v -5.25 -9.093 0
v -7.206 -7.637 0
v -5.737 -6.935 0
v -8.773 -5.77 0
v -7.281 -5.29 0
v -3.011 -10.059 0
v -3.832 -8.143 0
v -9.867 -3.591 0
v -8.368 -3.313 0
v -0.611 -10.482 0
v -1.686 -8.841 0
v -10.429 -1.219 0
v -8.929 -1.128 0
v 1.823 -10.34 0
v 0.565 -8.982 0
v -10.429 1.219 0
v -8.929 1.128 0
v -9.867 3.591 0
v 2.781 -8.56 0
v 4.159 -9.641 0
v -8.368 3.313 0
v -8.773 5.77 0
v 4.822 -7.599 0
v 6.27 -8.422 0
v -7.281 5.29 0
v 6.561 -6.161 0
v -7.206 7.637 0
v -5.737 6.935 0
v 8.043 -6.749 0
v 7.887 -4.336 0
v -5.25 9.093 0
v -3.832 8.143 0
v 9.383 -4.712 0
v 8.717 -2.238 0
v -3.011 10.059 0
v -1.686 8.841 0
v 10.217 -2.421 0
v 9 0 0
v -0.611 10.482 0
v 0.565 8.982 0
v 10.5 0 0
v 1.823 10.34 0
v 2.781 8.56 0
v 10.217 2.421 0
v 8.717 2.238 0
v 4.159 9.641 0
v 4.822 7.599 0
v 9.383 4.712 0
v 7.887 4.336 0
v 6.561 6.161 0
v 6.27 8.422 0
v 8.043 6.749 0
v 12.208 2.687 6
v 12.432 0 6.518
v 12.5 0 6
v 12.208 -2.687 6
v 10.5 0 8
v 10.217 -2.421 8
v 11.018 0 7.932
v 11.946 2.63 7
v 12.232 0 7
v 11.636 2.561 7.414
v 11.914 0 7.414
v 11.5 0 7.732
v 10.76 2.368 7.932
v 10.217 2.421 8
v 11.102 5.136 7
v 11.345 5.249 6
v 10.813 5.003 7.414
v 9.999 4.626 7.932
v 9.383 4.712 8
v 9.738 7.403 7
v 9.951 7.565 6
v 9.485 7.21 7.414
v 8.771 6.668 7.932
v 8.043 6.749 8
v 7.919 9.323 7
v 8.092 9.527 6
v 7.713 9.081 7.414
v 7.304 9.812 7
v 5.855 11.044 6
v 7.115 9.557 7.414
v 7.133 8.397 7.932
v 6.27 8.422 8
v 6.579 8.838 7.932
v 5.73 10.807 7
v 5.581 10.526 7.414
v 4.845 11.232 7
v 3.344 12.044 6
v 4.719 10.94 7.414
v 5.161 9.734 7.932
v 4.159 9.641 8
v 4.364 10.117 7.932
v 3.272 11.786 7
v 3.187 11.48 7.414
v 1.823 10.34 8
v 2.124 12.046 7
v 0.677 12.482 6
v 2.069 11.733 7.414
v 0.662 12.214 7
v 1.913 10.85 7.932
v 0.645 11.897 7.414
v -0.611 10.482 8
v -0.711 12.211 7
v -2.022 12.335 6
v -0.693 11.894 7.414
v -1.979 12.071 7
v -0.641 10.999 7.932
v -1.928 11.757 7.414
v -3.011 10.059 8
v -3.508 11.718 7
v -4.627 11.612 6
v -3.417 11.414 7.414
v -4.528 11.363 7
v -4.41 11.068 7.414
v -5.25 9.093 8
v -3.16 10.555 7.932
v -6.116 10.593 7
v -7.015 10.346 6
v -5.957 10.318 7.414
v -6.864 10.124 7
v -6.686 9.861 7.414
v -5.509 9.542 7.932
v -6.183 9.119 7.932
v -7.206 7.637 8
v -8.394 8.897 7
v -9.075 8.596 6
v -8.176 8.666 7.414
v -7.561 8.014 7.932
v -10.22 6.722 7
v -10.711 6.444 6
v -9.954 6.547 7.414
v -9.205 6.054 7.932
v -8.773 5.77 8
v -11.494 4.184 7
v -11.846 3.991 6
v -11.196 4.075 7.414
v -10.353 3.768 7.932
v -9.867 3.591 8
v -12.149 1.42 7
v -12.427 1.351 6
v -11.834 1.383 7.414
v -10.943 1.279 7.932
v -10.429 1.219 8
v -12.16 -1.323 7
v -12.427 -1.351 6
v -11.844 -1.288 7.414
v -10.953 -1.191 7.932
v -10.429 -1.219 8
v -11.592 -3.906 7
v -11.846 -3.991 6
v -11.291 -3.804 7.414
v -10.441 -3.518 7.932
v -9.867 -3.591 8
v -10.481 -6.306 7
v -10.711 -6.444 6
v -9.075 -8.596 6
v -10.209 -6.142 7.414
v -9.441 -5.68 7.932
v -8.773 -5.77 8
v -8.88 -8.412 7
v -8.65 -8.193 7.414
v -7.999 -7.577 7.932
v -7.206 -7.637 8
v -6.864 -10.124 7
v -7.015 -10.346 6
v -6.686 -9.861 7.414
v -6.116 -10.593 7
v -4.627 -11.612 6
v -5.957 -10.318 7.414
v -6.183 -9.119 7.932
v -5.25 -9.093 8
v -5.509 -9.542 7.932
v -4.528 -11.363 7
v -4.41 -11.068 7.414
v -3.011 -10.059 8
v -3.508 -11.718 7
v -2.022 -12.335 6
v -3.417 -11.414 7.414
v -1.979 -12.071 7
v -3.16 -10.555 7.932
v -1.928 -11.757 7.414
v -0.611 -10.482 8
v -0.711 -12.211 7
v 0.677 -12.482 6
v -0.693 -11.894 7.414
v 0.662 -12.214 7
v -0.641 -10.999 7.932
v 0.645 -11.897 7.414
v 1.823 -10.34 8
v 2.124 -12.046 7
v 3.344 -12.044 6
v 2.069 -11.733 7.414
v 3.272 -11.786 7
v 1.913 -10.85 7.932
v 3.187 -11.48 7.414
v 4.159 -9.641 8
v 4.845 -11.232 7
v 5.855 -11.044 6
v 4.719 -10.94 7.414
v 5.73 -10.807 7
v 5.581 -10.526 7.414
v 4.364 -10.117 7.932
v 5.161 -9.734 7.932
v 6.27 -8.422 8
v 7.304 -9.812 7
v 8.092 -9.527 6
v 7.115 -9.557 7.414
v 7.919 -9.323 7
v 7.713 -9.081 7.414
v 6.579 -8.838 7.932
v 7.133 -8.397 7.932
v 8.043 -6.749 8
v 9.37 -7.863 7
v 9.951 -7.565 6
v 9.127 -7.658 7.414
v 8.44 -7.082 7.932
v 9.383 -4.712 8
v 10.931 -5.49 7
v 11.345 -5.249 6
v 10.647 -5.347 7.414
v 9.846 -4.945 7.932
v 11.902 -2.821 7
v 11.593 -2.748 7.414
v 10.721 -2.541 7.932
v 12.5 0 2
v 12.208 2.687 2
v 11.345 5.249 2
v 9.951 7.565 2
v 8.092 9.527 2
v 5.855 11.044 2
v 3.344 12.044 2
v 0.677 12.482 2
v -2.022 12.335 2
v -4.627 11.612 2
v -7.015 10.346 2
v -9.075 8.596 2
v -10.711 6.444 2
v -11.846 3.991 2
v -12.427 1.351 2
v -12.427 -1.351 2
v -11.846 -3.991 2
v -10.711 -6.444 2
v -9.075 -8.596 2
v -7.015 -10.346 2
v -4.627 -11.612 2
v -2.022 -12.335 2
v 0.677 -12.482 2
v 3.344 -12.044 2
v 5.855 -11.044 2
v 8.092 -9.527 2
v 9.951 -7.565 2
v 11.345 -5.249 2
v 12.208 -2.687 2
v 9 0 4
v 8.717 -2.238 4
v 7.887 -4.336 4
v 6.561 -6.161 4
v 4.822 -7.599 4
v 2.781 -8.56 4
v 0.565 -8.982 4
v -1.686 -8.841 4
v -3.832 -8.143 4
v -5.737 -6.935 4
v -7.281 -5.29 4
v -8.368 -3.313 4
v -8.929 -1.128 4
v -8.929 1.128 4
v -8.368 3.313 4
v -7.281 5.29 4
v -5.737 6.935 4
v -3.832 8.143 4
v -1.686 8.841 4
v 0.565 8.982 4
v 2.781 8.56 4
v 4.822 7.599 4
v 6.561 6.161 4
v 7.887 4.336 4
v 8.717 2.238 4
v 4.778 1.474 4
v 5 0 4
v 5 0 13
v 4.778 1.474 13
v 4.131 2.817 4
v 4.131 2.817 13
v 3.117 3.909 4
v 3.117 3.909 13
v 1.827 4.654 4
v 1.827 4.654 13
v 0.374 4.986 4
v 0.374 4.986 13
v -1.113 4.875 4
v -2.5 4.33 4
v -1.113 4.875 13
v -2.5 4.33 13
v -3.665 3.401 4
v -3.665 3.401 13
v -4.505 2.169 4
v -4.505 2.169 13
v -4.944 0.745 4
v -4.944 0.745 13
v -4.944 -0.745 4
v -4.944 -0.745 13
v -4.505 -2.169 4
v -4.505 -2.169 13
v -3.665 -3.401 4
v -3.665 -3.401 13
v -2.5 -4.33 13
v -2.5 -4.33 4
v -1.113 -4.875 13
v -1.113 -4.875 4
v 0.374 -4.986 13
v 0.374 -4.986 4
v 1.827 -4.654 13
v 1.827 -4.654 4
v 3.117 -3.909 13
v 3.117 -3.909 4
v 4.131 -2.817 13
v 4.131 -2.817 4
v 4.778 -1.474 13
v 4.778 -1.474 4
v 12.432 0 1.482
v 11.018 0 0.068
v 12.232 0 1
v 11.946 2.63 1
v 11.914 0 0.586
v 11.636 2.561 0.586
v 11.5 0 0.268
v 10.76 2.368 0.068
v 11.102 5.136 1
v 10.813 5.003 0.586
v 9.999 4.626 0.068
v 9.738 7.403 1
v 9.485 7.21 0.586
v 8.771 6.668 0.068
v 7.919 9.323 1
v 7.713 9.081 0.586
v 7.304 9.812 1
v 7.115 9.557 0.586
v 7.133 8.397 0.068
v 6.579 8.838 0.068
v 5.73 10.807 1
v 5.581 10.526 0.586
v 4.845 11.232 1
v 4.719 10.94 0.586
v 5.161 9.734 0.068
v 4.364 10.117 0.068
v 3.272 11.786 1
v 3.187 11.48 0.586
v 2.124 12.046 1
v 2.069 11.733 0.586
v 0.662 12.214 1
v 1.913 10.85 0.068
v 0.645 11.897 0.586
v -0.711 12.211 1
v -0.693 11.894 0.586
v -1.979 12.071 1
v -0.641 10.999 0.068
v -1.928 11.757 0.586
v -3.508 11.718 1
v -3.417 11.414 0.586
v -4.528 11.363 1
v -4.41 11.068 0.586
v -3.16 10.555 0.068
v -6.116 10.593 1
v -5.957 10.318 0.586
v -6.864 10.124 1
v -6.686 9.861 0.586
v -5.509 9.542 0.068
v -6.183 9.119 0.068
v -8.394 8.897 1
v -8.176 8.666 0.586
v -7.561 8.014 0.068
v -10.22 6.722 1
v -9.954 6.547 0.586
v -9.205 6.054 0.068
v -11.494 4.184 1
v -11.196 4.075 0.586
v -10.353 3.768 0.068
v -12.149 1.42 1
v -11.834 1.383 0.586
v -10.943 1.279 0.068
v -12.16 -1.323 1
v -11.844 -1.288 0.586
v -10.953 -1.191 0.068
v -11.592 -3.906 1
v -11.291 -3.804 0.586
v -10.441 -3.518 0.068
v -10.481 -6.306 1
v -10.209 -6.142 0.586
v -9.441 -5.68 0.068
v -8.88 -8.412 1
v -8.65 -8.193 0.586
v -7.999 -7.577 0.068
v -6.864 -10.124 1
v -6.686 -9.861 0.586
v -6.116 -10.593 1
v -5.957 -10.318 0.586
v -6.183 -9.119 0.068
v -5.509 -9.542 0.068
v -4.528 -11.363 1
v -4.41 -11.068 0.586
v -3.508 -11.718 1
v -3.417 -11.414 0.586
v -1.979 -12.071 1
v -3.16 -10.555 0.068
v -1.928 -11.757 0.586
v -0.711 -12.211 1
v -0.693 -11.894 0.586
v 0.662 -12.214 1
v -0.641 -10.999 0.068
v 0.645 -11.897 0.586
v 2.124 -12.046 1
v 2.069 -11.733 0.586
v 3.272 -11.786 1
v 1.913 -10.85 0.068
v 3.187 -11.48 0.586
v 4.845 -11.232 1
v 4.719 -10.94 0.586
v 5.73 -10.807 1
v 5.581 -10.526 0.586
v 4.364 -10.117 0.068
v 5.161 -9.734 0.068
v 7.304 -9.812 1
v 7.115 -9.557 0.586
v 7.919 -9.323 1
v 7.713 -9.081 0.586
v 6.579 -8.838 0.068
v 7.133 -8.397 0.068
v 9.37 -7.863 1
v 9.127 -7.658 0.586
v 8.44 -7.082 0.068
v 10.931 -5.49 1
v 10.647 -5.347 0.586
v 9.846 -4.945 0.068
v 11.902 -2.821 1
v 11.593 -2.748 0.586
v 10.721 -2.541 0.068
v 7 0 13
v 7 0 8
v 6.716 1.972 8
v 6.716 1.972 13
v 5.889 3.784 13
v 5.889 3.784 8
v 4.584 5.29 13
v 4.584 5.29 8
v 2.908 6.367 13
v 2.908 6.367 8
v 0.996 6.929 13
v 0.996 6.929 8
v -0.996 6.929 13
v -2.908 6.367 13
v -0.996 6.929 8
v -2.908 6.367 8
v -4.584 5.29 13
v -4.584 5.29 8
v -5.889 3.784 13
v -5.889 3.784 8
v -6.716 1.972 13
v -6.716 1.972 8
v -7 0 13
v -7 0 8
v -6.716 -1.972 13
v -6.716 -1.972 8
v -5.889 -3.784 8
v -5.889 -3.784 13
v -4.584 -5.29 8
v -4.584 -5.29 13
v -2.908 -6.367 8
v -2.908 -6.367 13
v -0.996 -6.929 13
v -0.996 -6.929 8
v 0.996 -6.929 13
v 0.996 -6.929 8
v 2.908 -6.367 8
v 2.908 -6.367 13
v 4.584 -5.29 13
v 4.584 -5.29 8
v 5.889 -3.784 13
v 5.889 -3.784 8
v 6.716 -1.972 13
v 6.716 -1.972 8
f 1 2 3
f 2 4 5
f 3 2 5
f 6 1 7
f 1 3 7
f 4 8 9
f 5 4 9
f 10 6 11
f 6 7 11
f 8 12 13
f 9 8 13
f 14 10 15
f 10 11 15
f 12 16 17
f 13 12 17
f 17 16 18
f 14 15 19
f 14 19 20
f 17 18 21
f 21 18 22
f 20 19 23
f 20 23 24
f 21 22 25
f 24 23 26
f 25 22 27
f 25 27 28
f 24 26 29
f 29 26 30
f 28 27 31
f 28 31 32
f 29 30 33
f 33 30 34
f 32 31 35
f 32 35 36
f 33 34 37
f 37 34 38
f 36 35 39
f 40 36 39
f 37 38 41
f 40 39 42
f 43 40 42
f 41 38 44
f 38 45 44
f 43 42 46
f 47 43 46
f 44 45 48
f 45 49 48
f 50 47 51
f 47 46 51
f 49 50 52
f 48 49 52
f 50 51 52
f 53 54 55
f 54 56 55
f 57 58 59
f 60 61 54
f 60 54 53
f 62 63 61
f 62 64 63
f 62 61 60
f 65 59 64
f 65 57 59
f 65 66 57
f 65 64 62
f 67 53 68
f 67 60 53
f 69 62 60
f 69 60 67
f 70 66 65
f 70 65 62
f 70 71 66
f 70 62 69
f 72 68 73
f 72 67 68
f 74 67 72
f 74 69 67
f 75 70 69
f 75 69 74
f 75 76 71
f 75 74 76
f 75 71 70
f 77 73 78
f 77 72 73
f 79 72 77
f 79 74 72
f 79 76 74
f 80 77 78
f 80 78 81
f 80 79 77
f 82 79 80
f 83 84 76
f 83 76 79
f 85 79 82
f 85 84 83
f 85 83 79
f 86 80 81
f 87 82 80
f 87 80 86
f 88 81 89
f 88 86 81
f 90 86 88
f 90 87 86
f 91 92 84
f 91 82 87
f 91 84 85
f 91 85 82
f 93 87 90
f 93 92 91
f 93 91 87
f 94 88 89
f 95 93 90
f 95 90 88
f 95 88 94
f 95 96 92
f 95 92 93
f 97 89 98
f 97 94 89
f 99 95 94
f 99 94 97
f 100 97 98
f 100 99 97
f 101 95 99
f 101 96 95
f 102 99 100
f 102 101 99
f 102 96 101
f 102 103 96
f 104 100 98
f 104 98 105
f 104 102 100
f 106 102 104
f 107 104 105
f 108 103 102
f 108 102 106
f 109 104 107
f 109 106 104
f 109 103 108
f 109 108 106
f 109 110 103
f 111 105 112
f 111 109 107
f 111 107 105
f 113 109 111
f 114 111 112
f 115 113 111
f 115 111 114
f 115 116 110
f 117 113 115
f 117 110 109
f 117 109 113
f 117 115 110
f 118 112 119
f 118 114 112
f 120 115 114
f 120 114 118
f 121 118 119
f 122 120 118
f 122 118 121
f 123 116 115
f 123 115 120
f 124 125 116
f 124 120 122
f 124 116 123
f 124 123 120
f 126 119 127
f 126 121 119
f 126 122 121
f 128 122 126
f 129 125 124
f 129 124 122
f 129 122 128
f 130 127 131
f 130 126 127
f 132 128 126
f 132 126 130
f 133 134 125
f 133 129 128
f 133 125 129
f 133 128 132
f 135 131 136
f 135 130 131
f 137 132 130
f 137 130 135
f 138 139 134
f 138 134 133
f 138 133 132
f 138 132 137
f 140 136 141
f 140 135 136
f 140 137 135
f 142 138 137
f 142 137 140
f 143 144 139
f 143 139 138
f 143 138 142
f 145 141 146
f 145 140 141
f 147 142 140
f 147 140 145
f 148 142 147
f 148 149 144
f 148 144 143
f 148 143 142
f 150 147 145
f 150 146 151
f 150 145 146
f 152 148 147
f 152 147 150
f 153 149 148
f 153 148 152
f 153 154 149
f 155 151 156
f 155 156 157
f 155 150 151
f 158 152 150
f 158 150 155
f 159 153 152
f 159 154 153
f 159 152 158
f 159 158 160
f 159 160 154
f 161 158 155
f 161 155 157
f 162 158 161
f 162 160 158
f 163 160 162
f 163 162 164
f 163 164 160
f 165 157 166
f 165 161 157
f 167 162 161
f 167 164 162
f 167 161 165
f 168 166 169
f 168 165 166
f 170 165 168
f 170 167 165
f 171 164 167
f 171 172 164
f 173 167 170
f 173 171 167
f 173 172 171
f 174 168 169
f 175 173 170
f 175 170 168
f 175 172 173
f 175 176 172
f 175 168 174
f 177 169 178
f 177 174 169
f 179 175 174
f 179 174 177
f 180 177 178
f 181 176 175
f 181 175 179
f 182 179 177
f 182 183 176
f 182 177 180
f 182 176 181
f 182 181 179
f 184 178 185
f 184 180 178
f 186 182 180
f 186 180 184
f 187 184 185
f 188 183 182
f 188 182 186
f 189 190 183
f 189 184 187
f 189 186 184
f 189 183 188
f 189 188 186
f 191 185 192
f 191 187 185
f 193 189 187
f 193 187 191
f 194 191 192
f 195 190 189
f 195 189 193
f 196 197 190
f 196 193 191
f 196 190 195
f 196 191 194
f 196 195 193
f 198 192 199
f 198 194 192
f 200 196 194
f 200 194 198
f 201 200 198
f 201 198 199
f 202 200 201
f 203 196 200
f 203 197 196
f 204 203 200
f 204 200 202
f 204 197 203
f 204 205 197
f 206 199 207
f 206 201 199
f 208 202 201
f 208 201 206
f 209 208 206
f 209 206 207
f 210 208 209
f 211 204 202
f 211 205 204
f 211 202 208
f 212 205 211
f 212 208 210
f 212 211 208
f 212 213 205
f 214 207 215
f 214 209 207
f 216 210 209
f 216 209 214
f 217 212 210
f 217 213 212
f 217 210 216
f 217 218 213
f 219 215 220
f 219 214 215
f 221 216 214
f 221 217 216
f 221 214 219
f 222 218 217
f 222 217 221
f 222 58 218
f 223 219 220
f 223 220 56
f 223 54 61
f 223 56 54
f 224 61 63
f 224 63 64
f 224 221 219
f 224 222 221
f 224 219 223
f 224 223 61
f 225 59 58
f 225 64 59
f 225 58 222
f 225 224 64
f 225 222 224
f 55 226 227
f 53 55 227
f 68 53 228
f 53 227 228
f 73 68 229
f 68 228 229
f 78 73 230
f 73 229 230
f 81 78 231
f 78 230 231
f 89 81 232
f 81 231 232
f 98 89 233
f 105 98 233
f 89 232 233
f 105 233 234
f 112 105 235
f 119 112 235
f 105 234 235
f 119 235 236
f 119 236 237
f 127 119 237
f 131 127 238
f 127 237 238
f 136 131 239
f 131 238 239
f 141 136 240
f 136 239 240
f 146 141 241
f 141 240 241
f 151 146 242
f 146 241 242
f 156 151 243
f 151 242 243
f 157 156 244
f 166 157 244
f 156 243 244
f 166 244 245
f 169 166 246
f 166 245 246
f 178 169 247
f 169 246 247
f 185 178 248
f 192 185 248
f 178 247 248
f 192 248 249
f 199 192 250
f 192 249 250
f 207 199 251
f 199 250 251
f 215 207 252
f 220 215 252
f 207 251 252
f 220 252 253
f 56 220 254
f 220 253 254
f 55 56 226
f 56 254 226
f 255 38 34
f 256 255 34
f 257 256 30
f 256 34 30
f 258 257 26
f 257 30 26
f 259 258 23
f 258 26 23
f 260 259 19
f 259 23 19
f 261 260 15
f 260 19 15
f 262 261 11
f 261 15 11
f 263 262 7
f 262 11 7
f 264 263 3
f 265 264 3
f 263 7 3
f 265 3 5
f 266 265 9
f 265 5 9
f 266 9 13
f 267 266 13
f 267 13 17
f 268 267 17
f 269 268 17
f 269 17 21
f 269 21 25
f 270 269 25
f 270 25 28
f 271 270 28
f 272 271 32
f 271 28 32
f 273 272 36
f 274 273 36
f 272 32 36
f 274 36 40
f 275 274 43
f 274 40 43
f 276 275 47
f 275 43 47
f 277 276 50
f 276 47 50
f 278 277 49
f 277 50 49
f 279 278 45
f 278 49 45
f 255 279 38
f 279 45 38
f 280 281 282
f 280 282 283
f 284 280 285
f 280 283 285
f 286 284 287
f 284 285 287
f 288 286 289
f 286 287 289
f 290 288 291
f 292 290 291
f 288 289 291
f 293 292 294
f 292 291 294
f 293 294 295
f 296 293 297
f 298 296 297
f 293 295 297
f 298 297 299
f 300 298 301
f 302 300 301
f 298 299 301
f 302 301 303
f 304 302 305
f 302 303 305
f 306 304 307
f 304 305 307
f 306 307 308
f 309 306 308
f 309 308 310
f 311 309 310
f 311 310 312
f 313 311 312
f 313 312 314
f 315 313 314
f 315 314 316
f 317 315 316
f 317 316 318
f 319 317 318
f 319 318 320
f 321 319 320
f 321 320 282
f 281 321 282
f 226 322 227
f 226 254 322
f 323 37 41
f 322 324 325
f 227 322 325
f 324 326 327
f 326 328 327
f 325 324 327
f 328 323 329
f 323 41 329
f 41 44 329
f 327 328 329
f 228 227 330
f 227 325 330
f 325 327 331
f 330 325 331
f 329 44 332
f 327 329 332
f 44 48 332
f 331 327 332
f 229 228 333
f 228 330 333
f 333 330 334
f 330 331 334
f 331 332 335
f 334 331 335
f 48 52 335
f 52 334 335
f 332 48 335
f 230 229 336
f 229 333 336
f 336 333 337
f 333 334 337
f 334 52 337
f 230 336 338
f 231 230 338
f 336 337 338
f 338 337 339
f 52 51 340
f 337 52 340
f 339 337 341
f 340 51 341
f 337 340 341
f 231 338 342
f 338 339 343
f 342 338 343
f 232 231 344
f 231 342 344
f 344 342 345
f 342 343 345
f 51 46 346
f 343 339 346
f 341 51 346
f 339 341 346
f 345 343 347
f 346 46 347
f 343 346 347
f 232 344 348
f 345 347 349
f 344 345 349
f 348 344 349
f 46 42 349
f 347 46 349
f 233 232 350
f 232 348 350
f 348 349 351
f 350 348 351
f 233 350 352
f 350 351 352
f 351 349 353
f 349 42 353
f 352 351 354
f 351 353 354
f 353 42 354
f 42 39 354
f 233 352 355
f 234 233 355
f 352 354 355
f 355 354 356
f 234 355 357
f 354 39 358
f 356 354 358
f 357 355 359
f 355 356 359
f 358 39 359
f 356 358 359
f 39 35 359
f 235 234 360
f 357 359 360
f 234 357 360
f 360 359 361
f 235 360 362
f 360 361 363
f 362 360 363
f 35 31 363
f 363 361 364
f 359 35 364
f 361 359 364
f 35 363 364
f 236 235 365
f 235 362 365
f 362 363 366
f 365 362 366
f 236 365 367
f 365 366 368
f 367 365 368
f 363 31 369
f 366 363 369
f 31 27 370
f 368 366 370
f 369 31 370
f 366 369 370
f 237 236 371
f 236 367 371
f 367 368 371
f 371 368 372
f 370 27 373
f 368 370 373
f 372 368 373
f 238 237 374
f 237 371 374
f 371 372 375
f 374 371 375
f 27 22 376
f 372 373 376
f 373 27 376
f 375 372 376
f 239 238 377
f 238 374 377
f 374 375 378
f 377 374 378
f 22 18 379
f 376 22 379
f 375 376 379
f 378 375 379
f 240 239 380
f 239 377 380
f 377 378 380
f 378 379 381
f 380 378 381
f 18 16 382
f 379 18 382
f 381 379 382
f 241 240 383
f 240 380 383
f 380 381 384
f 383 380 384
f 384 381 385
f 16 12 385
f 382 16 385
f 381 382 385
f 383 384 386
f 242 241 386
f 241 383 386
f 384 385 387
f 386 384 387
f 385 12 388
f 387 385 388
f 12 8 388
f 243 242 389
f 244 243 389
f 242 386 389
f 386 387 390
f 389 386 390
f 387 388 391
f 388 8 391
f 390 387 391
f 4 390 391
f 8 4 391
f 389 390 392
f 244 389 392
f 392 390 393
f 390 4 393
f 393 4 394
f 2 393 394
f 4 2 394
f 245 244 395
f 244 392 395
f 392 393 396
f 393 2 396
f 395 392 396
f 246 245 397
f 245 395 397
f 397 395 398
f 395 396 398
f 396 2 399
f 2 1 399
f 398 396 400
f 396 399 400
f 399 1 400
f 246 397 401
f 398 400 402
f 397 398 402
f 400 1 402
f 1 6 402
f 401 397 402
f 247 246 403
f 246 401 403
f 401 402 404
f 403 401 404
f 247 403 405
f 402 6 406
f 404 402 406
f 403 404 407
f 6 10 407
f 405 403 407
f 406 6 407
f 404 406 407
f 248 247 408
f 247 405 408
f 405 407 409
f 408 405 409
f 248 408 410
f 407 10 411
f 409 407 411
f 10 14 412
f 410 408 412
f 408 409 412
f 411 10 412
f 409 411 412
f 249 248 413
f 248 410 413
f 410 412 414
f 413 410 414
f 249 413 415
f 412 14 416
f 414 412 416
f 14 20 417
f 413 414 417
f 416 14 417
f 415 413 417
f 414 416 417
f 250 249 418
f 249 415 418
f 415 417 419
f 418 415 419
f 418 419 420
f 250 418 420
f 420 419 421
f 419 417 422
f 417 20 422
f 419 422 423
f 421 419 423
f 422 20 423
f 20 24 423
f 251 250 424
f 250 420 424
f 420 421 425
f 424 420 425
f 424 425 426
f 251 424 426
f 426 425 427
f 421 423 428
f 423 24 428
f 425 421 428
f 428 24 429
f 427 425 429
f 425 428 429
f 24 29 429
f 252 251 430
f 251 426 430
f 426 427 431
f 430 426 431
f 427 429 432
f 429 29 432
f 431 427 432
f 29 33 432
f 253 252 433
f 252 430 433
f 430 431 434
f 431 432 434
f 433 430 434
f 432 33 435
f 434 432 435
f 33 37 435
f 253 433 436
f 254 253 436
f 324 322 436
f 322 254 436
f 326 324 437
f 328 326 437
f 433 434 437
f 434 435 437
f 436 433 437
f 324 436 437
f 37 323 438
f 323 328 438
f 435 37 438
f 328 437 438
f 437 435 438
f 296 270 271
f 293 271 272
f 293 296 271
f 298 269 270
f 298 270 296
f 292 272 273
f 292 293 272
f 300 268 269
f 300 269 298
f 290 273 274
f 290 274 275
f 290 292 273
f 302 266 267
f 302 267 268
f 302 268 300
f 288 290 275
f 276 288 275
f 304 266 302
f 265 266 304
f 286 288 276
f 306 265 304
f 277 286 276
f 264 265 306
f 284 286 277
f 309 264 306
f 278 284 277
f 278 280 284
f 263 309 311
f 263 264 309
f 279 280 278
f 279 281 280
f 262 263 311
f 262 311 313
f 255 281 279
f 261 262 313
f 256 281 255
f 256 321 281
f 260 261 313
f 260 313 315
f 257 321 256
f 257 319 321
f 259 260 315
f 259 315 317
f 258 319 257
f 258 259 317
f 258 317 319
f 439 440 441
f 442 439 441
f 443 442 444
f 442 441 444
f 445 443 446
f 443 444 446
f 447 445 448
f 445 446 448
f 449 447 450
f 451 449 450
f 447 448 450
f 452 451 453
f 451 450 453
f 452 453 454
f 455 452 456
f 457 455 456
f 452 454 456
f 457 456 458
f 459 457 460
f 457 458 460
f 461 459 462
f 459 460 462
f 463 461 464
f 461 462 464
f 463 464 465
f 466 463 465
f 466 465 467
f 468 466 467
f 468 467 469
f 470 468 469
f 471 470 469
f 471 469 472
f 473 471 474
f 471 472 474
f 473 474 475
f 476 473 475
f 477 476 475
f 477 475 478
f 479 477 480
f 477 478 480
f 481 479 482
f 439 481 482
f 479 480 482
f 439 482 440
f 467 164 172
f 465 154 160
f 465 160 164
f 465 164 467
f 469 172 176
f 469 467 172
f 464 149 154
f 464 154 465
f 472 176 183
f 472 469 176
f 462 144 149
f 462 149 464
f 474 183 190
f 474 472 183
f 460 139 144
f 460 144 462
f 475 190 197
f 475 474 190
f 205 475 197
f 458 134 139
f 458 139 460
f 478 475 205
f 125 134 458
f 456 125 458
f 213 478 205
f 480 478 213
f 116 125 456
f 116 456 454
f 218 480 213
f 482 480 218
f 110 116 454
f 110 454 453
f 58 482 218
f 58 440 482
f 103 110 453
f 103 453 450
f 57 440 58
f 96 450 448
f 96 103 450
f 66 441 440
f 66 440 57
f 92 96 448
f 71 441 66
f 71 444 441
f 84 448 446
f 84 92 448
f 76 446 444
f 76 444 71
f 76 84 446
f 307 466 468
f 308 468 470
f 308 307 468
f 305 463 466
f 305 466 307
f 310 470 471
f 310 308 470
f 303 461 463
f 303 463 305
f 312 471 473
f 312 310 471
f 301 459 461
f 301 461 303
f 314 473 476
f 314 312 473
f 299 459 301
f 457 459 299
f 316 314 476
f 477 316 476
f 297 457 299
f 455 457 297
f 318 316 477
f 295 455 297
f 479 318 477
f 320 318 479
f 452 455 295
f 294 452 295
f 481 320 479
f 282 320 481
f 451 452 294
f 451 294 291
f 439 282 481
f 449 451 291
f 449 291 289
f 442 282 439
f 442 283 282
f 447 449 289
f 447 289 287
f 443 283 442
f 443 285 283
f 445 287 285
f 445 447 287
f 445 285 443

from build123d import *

# Parameters (mm, degrees)
F0_R     = 12.5
F1_DEPTH = 8
F2_R     = 7
F3_DEPTH = 5
F4_R     = 5
F5_DEPTH = 25
F6_R     = 9
F7_DEPTH = 4
F8_R     = 2


with BuildPart() as f1:
    # F0 (on Top) → F1 (new body)
    with BuildSketch(Plane.XY):
        Circle(F0_R)
    extrude(amount=F1_DEPTH)

    # F2 (on face) → F3 (join)
    with BuildSketch(Plane.XY.offset(8)):
        Circle(F2_R)
    extrude(amount=F3_DEPTH)

    # F4 (on face) → F5 (cut)
    with BuildSketch(Plane.XY.offset(13)):
        Circle(F4_R)
    extrude(amount=-F5_DEPTH, mode=Mode.SUBTRACT)

    # F6 (on face) → F7 (cut)
    with BuildSketch(Plane(origin=(0, 0, 0), x_dir=(1, 0, 0), z_dir=(0, 0, -1))):
        Circle(F6_R)
    extrude(amount=-F7_DEPTH, mode=Mode.SUBTRACT)

    # F8
    f8_edges = [f1.edges().sort_by_distance(p)[0] for p in [
        (-12.5, 0, 0),
        (-12.5, 0, 8),
    ]]
    fillet(f8_edges, radius=F8_R)


solid = f1.part
